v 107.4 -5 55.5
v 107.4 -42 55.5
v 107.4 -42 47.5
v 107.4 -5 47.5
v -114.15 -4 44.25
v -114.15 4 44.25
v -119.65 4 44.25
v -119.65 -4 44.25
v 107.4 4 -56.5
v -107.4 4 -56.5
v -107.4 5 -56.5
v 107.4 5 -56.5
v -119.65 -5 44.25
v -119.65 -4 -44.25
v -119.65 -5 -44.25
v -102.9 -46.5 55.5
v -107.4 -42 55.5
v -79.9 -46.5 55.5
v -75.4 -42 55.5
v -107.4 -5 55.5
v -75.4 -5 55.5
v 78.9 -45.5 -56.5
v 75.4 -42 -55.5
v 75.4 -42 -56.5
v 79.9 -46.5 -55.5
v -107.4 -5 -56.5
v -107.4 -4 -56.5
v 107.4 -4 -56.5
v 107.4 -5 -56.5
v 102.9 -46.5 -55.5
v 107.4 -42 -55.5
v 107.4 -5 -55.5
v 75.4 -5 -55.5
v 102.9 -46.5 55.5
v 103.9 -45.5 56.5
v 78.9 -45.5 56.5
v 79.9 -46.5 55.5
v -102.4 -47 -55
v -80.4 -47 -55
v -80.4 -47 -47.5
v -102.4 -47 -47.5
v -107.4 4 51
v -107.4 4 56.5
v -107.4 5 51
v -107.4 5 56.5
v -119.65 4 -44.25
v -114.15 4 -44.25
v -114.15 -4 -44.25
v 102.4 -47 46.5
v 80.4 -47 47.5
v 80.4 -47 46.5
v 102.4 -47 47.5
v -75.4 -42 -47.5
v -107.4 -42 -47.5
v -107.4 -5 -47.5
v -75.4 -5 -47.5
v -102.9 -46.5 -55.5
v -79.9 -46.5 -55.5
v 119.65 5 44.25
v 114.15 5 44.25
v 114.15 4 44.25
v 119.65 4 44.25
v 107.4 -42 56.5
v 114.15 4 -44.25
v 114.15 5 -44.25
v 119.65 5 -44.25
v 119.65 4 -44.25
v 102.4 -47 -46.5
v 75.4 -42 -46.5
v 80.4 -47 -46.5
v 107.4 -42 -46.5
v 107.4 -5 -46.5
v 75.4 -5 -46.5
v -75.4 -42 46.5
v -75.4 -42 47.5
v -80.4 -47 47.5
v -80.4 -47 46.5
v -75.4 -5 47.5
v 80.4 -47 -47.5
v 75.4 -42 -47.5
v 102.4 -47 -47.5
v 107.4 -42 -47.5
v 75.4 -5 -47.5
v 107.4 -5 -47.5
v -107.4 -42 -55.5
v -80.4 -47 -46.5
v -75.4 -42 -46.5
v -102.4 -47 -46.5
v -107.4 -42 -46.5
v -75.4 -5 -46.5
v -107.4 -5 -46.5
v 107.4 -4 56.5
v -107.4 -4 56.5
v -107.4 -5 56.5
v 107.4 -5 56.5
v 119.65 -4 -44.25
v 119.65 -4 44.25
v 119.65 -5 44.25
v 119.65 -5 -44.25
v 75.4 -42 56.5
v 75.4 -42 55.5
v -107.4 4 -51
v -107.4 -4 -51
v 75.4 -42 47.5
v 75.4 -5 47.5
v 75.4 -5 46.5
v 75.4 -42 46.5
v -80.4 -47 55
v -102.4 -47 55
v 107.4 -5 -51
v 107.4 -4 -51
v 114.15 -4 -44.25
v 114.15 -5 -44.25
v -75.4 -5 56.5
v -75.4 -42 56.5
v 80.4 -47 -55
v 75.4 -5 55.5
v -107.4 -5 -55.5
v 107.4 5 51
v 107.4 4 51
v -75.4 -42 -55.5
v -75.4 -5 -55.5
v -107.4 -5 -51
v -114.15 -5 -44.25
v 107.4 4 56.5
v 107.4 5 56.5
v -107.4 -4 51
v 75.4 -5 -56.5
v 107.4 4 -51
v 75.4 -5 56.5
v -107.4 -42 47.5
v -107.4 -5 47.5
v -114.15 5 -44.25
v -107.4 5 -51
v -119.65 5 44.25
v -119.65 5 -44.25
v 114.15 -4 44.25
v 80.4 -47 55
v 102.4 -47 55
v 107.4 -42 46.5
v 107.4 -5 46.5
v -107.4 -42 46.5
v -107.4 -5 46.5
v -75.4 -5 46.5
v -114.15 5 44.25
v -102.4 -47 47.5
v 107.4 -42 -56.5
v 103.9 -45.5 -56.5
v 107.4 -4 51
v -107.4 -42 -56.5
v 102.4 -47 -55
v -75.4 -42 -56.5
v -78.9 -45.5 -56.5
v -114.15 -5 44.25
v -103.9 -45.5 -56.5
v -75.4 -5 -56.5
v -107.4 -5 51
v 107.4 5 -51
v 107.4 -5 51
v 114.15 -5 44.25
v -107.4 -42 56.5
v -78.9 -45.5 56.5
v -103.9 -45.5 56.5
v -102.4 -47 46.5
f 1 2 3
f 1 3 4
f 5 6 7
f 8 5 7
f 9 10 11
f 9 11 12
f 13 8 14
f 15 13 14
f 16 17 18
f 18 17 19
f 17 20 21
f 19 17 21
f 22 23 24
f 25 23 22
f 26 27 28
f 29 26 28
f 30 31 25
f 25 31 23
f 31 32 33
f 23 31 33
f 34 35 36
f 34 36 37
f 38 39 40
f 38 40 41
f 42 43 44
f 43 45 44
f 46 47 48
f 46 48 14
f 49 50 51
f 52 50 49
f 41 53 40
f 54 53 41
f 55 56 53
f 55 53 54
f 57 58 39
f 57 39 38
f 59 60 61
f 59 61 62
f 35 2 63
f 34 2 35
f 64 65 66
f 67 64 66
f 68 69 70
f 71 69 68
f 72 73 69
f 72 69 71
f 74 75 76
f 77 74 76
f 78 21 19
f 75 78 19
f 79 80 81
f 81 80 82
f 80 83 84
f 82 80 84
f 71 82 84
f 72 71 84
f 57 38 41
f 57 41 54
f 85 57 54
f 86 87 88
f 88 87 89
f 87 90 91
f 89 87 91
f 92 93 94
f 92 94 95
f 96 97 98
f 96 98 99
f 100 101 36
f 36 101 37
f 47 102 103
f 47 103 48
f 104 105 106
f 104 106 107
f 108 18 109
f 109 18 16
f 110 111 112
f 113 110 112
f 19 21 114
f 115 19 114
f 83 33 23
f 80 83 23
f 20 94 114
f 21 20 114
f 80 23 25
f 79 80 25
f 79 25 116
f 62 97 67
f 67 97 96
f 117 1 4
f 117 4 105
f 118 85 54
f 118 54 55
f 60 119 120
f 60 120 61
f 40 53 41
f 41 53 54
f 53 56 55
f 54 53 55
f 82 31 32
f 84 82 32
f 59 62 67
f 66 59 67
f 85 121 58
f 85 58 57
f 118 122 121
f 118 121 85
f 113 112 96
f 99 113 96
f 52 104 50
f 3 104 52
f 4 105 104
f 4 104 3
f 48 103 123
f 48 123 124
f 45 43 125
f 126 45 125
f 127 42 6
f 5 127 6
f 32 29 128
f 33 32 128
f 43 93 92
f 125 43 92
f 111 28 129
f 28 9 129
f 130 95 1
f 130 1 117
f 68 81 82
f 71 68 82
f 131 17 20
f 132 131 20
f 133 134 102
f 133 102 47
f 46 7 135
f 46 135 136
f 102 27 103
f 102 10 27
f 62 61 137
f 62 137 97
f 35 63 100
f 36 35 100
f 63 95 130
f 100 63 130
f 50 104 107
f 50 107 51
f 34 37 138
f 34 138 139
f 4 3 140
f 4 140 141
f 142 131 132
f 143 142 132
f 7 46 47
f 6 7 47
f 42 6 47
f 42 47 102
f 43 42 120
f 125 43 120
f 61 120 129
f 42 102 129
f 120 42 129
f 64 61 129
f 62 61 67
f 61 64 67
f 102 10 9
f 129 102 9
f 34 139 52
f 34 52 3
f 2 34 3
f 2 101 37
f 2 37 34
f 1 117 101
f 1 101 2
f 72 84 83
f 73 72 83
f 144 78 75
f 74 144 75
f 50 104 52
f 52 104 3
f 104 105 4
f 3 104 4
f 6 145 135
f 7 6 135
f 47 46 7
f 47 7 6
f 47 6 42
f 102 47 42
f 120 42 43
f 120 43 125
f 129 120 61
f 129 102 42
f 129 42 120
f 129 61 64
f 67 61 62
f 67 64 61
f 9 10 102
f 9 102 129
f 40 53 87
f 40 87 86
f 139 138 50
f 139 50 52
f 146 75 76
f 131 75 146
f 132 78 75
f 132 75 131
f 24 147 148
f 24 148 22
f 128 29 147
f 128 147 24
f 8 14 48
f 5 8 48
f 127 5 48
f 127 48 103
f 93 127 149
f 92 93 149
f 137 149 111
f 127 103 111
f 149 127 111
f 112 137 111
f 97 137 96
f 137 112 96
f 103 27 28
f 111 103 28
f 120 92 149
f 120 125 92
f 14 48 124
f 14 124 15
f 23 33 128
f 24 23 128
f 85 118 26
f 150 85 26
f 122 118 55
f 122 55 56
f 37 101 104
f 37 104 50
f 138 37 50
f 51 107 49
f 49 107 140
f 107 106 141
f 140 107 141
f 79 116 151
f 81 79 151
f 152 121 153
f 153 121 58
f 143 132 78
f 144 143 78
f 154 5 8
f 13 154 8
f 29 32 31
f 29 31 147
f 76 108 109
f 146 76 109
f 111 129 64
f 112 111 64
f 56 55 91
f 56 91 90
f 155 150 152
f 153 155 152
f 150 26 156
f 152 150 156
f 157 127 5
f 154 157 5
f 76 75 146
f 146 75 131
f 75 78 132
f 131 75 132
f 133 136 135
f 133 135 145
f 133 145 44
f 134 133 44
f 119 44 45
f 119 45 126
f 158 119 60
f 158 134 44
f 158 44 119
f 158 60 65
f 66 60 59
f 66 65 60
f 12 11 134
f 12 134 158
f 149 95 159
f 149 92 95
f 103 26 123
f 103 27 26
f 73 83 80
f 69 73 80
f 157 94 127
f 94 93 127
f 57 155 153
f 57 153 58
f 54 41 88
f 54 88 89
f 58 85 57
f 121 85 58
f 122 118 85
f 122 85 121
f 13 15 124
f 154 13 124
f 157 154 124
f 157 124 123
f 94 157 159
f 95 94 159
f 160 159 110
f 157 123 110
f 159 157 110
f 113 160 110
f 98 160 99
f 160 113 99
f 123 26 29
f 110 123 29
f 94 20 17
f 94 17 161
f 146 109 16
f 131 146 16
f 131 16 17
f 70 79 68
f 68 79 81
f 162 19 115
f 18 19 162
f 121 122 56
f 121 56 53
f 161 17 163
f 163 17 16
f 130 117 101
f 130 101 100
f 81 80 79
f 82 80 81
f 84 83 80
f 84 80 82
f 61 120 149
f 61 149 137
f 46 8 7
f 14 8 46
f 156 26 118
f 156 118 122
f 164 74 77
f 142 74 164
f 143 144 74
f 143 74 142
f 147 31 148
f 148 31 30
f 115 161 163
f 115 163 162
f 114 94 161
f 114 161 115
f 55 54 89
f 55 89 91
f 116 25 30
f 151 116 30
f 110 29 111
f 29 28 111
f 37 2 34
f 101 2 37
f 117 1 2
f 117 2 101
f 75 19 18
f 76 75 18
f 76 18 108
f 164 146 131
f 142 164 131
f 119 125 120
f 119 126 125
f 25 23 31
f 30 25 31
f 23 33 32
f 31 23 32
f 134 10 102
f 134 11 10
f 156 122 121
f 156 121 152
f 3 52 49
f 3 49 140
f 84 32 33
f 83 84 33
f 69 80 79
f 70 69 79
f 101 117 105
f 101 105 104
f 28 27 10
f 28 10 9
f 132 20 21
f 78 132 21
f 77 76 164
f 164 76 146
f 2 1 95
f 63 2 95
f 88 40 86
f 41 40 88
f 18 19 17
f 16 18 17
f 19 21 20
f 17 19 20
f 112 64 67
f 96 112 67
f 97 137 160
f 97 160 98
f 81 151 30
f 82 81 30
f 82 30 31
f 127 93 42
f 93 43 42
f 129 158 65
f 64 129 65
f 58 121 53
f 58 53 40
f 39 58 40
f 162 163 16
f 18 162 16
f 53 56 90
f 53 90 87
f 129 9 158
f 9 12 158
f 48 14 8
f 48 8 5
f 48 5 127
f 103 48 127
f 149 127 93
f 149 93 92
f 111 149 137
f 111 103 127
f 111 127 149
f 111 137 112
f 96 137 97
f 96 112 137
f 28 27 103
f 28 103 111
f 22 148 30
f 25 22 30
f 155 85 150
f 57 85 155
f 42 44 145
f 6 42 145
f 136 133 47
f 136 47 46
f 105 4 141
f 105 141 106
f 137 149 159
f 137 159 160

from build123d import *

# Parameters (mm, degrees)
BOSS_EXTRUDE1_START  = 4
SKETCH3_W            = 239.3
SKETCH3_H            = 113
BOSS_EXTRUDE1_DEPTH  = 1
BOSS_EXTRUDE2_START  = -4
SKETCH3_2_W          = 239.3
SKETCH3_2_H          = 113
BOSS_EXTRUDE2_DEPTH  = 8
CUT_EXTRUDE1_DEPTH   = 133.413641669
MIRROR6_COPY_1_DEPTH = 133.413641669
SKETCH4_W            = 32
SKETCH4_H            = 1
BOSS_EXTRUDE3_DEPTH  = 42
CHAMFER1_SIZE        = 5
BOSS_EXTRUDE4_DEPTH  = 8
BOSS_EXTRUDE5_DEPTH  = 1
CHAMFER2_SIZE        = 1.5
CHAMFER3_SIZE        = 0.5


with BuildPart() as part:
    # Sketch3 → Boss-Extrude1 (new body)
    with BuildSketch(Plane(origin=(0, 0, 0), x_dir=(1, 0, 0), z_dir=(0, 1, 0)).offset(BOSS_EXTRUDE1_START)):
        Rectangle(SKETCH3_W, SKETCH3_H)
    extrude(amount=BOSS_EXTRUDE1_DEPTH)


with BuildPart() as body_2:
    # Mirror3: mirrored copy
    add(part.part.mirror(Plane.ZX))


with BuildPart() as body_3:
    # Sketch3<2> → Boss-Extrude2 (new body)
    with BuildSketch(Plane(origin=(0, 0, 0), x_dir=(1, 0, 0), z_dir=(0, 1, 0)).offset(BOSS_EXTRUDE2_START)):
        Rectangle(SKETCH3_2_W, SKETCH3_2_H)
    extrude(amount=BOSS_EXTRUDE2_DEPTH)


with BuildPart() as cut_extrude1_tool:
    # Sketch2 → Cut-Extrude1 (new, symmetric)
    with BuildSketch(Plane(origin=(0, 0, 0), x_dir=(1, 0, 0), z_dir=(0, 1, 0))):
        Polygon((-110.4, 57), (-107.4, 57), (-107.4, 51), (-114.15, 44.25), (-120.15, 44.25), (-120.15, 47.25), (-120.15, 57), align=None)
    cut_extrude1 = extrude(amount=CUT_EXTRUDE1_DEPTH, both=True)


with BuildPart() as part_1:
    add(part.part)

    # Cut-Extrude1: cut by cut_extrude1_tool
    add(cut_extrude1_tool.part, mode=Mode.SUBTRACT)


with BuildPart() as body_2_1:
    add(body_2.part)

    # Cut-Extrude1: cut by cut_extrude1_tool
    add(cut_extrude1_tool.part, mode=Mode.SUBTRACT)


with BuildPart() as body_3_1:
    add(body_3.part)

    # Cut-Extrude1: cut by cut_extrude1_tool
    add(cut_extrude1_tool.part, mode=Mode.SUBTRACT)


with BuildPart() as mirror5_tool:
    # Mirror5: Cut-Extrude1 across plane
    add(cut_extrude1.mirror(Plane.XY))


with BuildPart() as part_2:
    add(part_1.part)

    # Mirror5: cut by mirror5_tool
    add(mirror5_tool.part, mode=Mode.SUBTRACT)


with BuildPart() as body_2_2:
    add(body_2_1.part)

    # Mirror5: cut by mirror5_tool
    add(mirror5_tool.part, mode=Mode.SUBTRACT)


with BuildPart() as body_3_2:
    add(body_3_1.part)

    # Mirror5: cut by mirror5_tool
    add(mirror5_tool.part, mode=Mode.SUBTRACT)


with BuildPart() as mirror6_tool:
    # Mirror6: Cut-Extrude1 across plane
    add(cut_extrude1.mirror(Plane(origin=(0, 0, 0), x_dir=(0, 0, 1), z_dir=(1, 0, 0))))


with BuildPart() as part_3:
    add(part_2.part)

    # Mirror6: cut by mirror6_tool
    add(mirror6_tool.part, mode=Mode.SUBTRACT)


with BuildPart() as body_2_3:
    add(body_2_2.part)

    # Mirror6: cut by mirror6_tool
    add(mirror6_tool.part, mode=Mode.SUBTRACT)


with BuildPart() as body_3_3:
    add(body_3_2.part)

    # Mirror6: cut by mirror6_tool
    add(mirror6_tool.part, mode=Mode.SUBTRACT)


with BuildPart() as mirror6_copy_1_tool:
    # Mirror6 copy 1 sketch → Mirror6 copy 1 (new, symmetric)
    with BuildSketch(Plane(origin=(0, 0, 0), x_dir=(-1, 0, 0), z_dir=(0, 1, 0))):
        Polygon((-110.4, 57), (-107.4, 57), (-107.4, 51), (-114.15, 44.25), (-120.15, 44.25), (-120.15, 47.25), (-120.15, 57), align=None)
    extrude(amount=MIRROR6_COPY_1_DEPTH, both=True)


with BuildPart() as part_4:
    add(part_3.part)

    # Mirror6 copy 1: cut by mirror6_copy_1_tool
    add(mirror6_copy_1_tool.part, mode=Mode.SUBTRACT)


with BuildPart() as body_2_4:
    add(body_2_3.part)

    # Mirror6 copy 1: cut by mirror6_copy_1_tool
    add(mirror6_copy_1_tool.part, mode=Mode.SUBTRACT)


with BuildPart() as body_3_4:
    add(body_3_3.part)

    # Mirror6 copy 1: cut by mirror6_copy_1_tool
    add(mirror6_copy_1_tool.part, mode=Mode.SUBTRACT)


with BuildPart() as body_4:
    # Sketch4 → Boss-Extrude3 (new body)
    with BuildSketch(Plane.XZ.offset(5)):
        with Locations((-91.4, 56)):
            Rectangle(SKETCH4_W, SKETCH4_H)
    extrude(amount=BOSS_EXTRUDE3_DEPTH)

    # Chamfer1
    chamfer1_edges = [body_4.edges().sort_by_distance(p)[0] for p in [
        (-75.4, -47, 56),
        (-107.4, -47, 56),
    ]]
    chamfer(chamfer1_edges, length=CHAMFER1_SIZE)

    # Chamfer2
    # the kernel refuses this chamfer: 1.5 mm, written as the material it takes off along each edge
    with BuildSketch(Plane(origin=(-106.257524482, -47, 56.5), x_dir=(0, 0.9996219169112965, 0.02749587661058676), z_dir=(1, 0, 0))) as chamfer2_piece_1:
        Polygon((CHAMFER2_SIZE * 0.999621916911, -CHAMFER2_SIZE * 0.0274958766106), (-CHAMFER2_SIZE * 0.0274958766106, -CHAMFER2_SIZE * 0.999621916911), (0, 0), align=None)
    extrude(amount=29.715048964, mode=Mode.SUBTRACT)


with BuildPart() as body_5:
    # Sketch6 → Boss-Extrude4 (new body)
    with BuildSketch(Plane(origin=(0, 0, 55.5), x_dir=(-1, 0, 0), z_dir=(0, 0, -1))):
        Polygon((107.4, -5), (75.4, -5), (75.4, -42), (80.4, -47), (102.4, -47), (107.4, -42), align=None)
    extrude(amount=BOSS_EXTRUDE4_DEPTH)

    # Chamfer3
    chamfer3_edges = [body_5.edges().sort_by_distance(p)[0] for p in [
        (-91.4, -47, 55.5),
    ]]
    chamfer(chamfer3_edges, length=CHAMFER3_SIZE)


with BuildPart() as body_6:
    # Sketch7 → Boss-Extrude5 (new body)
    with BuildSketch(Plane(origin=(0, 0, 47.5), x_dir=(-1, 0, 0), z_dir=(0, 0, -1))):
        Polygon((107.4, -42), (107.4, -5), (75.4, -5), (75.4, -42), (80.4, -47), (102.4, -47), align=None)
    extrude(amount=BOSS_EXTRUDE5_DEPTH)


with BuildPart() as body_7:
    # Mirror7: mirrored copy
    add(body_6.part.mirror(Plane.XY))


with BuildPart() as body_8:
    # Mirror7 2: mirrored copy
    add(body_5.part.mirror(Plane.XY))


with BuildPart() as body_9:
    # Mirror7 3: mirrored copy
    add(body_4.part.mirror(Plane.XY))


with BuildPart() as body_10:
    # Mirror8: mirrored copy
    add(body_9.part.mirror(Plane(origin=(0, 0, 0), x_dir=(0, 0, 1), z_dir=(1, 0, 0))))


with BuildPart() as body_11:
    # Mirror8 2: mirrored copy
    add(body_8.part.mirror(Plane(origin=(0, 0, 0), x_dir=(0, 0, 1), z_dir=(1, 0, 0))))


with BuildPart() as body_12:
    # Mirror8 3: mirrored copy
    add(body_6.part.mirror(Plane(origin=(0, 0, 0), x_dir=(0, 0, 1), z_dir=(1, 0, 0))))


with BuildPart() as body_13:
    # Mirror8 4: mirrored copy
    add(body_5.part.mirror(Plane(origin=(0, 0, 0), x_dir=(0, 0, 1), z_dir=(1, 0, 0))))


with BuildPart() as body_14:
    # Mirror8 5: mirrored copy
    add(body_7.part.mirror(Plane(origin=(0, 0, 0), x_dir=(0, 0, 1), z_dir=(1, 0, 0))))


with BuildPart() as body_15:
    # Mirror8 6: mirrored copy
    add(body_4.part.mirror(Plane(origin=(0, 0, 0), x_dir=(0, 0, 1), z_dir=(1, 0, 0))))


solid = Compound([part_4.part, body_2_4.part, body_3_4.part, body_4.part, body_5.part, body_6.part, body_7.part, body_8.part, body_9.part, body_10.part, body_11.part, body_12.part, body_13.part, body_14.part, body_15.part])
